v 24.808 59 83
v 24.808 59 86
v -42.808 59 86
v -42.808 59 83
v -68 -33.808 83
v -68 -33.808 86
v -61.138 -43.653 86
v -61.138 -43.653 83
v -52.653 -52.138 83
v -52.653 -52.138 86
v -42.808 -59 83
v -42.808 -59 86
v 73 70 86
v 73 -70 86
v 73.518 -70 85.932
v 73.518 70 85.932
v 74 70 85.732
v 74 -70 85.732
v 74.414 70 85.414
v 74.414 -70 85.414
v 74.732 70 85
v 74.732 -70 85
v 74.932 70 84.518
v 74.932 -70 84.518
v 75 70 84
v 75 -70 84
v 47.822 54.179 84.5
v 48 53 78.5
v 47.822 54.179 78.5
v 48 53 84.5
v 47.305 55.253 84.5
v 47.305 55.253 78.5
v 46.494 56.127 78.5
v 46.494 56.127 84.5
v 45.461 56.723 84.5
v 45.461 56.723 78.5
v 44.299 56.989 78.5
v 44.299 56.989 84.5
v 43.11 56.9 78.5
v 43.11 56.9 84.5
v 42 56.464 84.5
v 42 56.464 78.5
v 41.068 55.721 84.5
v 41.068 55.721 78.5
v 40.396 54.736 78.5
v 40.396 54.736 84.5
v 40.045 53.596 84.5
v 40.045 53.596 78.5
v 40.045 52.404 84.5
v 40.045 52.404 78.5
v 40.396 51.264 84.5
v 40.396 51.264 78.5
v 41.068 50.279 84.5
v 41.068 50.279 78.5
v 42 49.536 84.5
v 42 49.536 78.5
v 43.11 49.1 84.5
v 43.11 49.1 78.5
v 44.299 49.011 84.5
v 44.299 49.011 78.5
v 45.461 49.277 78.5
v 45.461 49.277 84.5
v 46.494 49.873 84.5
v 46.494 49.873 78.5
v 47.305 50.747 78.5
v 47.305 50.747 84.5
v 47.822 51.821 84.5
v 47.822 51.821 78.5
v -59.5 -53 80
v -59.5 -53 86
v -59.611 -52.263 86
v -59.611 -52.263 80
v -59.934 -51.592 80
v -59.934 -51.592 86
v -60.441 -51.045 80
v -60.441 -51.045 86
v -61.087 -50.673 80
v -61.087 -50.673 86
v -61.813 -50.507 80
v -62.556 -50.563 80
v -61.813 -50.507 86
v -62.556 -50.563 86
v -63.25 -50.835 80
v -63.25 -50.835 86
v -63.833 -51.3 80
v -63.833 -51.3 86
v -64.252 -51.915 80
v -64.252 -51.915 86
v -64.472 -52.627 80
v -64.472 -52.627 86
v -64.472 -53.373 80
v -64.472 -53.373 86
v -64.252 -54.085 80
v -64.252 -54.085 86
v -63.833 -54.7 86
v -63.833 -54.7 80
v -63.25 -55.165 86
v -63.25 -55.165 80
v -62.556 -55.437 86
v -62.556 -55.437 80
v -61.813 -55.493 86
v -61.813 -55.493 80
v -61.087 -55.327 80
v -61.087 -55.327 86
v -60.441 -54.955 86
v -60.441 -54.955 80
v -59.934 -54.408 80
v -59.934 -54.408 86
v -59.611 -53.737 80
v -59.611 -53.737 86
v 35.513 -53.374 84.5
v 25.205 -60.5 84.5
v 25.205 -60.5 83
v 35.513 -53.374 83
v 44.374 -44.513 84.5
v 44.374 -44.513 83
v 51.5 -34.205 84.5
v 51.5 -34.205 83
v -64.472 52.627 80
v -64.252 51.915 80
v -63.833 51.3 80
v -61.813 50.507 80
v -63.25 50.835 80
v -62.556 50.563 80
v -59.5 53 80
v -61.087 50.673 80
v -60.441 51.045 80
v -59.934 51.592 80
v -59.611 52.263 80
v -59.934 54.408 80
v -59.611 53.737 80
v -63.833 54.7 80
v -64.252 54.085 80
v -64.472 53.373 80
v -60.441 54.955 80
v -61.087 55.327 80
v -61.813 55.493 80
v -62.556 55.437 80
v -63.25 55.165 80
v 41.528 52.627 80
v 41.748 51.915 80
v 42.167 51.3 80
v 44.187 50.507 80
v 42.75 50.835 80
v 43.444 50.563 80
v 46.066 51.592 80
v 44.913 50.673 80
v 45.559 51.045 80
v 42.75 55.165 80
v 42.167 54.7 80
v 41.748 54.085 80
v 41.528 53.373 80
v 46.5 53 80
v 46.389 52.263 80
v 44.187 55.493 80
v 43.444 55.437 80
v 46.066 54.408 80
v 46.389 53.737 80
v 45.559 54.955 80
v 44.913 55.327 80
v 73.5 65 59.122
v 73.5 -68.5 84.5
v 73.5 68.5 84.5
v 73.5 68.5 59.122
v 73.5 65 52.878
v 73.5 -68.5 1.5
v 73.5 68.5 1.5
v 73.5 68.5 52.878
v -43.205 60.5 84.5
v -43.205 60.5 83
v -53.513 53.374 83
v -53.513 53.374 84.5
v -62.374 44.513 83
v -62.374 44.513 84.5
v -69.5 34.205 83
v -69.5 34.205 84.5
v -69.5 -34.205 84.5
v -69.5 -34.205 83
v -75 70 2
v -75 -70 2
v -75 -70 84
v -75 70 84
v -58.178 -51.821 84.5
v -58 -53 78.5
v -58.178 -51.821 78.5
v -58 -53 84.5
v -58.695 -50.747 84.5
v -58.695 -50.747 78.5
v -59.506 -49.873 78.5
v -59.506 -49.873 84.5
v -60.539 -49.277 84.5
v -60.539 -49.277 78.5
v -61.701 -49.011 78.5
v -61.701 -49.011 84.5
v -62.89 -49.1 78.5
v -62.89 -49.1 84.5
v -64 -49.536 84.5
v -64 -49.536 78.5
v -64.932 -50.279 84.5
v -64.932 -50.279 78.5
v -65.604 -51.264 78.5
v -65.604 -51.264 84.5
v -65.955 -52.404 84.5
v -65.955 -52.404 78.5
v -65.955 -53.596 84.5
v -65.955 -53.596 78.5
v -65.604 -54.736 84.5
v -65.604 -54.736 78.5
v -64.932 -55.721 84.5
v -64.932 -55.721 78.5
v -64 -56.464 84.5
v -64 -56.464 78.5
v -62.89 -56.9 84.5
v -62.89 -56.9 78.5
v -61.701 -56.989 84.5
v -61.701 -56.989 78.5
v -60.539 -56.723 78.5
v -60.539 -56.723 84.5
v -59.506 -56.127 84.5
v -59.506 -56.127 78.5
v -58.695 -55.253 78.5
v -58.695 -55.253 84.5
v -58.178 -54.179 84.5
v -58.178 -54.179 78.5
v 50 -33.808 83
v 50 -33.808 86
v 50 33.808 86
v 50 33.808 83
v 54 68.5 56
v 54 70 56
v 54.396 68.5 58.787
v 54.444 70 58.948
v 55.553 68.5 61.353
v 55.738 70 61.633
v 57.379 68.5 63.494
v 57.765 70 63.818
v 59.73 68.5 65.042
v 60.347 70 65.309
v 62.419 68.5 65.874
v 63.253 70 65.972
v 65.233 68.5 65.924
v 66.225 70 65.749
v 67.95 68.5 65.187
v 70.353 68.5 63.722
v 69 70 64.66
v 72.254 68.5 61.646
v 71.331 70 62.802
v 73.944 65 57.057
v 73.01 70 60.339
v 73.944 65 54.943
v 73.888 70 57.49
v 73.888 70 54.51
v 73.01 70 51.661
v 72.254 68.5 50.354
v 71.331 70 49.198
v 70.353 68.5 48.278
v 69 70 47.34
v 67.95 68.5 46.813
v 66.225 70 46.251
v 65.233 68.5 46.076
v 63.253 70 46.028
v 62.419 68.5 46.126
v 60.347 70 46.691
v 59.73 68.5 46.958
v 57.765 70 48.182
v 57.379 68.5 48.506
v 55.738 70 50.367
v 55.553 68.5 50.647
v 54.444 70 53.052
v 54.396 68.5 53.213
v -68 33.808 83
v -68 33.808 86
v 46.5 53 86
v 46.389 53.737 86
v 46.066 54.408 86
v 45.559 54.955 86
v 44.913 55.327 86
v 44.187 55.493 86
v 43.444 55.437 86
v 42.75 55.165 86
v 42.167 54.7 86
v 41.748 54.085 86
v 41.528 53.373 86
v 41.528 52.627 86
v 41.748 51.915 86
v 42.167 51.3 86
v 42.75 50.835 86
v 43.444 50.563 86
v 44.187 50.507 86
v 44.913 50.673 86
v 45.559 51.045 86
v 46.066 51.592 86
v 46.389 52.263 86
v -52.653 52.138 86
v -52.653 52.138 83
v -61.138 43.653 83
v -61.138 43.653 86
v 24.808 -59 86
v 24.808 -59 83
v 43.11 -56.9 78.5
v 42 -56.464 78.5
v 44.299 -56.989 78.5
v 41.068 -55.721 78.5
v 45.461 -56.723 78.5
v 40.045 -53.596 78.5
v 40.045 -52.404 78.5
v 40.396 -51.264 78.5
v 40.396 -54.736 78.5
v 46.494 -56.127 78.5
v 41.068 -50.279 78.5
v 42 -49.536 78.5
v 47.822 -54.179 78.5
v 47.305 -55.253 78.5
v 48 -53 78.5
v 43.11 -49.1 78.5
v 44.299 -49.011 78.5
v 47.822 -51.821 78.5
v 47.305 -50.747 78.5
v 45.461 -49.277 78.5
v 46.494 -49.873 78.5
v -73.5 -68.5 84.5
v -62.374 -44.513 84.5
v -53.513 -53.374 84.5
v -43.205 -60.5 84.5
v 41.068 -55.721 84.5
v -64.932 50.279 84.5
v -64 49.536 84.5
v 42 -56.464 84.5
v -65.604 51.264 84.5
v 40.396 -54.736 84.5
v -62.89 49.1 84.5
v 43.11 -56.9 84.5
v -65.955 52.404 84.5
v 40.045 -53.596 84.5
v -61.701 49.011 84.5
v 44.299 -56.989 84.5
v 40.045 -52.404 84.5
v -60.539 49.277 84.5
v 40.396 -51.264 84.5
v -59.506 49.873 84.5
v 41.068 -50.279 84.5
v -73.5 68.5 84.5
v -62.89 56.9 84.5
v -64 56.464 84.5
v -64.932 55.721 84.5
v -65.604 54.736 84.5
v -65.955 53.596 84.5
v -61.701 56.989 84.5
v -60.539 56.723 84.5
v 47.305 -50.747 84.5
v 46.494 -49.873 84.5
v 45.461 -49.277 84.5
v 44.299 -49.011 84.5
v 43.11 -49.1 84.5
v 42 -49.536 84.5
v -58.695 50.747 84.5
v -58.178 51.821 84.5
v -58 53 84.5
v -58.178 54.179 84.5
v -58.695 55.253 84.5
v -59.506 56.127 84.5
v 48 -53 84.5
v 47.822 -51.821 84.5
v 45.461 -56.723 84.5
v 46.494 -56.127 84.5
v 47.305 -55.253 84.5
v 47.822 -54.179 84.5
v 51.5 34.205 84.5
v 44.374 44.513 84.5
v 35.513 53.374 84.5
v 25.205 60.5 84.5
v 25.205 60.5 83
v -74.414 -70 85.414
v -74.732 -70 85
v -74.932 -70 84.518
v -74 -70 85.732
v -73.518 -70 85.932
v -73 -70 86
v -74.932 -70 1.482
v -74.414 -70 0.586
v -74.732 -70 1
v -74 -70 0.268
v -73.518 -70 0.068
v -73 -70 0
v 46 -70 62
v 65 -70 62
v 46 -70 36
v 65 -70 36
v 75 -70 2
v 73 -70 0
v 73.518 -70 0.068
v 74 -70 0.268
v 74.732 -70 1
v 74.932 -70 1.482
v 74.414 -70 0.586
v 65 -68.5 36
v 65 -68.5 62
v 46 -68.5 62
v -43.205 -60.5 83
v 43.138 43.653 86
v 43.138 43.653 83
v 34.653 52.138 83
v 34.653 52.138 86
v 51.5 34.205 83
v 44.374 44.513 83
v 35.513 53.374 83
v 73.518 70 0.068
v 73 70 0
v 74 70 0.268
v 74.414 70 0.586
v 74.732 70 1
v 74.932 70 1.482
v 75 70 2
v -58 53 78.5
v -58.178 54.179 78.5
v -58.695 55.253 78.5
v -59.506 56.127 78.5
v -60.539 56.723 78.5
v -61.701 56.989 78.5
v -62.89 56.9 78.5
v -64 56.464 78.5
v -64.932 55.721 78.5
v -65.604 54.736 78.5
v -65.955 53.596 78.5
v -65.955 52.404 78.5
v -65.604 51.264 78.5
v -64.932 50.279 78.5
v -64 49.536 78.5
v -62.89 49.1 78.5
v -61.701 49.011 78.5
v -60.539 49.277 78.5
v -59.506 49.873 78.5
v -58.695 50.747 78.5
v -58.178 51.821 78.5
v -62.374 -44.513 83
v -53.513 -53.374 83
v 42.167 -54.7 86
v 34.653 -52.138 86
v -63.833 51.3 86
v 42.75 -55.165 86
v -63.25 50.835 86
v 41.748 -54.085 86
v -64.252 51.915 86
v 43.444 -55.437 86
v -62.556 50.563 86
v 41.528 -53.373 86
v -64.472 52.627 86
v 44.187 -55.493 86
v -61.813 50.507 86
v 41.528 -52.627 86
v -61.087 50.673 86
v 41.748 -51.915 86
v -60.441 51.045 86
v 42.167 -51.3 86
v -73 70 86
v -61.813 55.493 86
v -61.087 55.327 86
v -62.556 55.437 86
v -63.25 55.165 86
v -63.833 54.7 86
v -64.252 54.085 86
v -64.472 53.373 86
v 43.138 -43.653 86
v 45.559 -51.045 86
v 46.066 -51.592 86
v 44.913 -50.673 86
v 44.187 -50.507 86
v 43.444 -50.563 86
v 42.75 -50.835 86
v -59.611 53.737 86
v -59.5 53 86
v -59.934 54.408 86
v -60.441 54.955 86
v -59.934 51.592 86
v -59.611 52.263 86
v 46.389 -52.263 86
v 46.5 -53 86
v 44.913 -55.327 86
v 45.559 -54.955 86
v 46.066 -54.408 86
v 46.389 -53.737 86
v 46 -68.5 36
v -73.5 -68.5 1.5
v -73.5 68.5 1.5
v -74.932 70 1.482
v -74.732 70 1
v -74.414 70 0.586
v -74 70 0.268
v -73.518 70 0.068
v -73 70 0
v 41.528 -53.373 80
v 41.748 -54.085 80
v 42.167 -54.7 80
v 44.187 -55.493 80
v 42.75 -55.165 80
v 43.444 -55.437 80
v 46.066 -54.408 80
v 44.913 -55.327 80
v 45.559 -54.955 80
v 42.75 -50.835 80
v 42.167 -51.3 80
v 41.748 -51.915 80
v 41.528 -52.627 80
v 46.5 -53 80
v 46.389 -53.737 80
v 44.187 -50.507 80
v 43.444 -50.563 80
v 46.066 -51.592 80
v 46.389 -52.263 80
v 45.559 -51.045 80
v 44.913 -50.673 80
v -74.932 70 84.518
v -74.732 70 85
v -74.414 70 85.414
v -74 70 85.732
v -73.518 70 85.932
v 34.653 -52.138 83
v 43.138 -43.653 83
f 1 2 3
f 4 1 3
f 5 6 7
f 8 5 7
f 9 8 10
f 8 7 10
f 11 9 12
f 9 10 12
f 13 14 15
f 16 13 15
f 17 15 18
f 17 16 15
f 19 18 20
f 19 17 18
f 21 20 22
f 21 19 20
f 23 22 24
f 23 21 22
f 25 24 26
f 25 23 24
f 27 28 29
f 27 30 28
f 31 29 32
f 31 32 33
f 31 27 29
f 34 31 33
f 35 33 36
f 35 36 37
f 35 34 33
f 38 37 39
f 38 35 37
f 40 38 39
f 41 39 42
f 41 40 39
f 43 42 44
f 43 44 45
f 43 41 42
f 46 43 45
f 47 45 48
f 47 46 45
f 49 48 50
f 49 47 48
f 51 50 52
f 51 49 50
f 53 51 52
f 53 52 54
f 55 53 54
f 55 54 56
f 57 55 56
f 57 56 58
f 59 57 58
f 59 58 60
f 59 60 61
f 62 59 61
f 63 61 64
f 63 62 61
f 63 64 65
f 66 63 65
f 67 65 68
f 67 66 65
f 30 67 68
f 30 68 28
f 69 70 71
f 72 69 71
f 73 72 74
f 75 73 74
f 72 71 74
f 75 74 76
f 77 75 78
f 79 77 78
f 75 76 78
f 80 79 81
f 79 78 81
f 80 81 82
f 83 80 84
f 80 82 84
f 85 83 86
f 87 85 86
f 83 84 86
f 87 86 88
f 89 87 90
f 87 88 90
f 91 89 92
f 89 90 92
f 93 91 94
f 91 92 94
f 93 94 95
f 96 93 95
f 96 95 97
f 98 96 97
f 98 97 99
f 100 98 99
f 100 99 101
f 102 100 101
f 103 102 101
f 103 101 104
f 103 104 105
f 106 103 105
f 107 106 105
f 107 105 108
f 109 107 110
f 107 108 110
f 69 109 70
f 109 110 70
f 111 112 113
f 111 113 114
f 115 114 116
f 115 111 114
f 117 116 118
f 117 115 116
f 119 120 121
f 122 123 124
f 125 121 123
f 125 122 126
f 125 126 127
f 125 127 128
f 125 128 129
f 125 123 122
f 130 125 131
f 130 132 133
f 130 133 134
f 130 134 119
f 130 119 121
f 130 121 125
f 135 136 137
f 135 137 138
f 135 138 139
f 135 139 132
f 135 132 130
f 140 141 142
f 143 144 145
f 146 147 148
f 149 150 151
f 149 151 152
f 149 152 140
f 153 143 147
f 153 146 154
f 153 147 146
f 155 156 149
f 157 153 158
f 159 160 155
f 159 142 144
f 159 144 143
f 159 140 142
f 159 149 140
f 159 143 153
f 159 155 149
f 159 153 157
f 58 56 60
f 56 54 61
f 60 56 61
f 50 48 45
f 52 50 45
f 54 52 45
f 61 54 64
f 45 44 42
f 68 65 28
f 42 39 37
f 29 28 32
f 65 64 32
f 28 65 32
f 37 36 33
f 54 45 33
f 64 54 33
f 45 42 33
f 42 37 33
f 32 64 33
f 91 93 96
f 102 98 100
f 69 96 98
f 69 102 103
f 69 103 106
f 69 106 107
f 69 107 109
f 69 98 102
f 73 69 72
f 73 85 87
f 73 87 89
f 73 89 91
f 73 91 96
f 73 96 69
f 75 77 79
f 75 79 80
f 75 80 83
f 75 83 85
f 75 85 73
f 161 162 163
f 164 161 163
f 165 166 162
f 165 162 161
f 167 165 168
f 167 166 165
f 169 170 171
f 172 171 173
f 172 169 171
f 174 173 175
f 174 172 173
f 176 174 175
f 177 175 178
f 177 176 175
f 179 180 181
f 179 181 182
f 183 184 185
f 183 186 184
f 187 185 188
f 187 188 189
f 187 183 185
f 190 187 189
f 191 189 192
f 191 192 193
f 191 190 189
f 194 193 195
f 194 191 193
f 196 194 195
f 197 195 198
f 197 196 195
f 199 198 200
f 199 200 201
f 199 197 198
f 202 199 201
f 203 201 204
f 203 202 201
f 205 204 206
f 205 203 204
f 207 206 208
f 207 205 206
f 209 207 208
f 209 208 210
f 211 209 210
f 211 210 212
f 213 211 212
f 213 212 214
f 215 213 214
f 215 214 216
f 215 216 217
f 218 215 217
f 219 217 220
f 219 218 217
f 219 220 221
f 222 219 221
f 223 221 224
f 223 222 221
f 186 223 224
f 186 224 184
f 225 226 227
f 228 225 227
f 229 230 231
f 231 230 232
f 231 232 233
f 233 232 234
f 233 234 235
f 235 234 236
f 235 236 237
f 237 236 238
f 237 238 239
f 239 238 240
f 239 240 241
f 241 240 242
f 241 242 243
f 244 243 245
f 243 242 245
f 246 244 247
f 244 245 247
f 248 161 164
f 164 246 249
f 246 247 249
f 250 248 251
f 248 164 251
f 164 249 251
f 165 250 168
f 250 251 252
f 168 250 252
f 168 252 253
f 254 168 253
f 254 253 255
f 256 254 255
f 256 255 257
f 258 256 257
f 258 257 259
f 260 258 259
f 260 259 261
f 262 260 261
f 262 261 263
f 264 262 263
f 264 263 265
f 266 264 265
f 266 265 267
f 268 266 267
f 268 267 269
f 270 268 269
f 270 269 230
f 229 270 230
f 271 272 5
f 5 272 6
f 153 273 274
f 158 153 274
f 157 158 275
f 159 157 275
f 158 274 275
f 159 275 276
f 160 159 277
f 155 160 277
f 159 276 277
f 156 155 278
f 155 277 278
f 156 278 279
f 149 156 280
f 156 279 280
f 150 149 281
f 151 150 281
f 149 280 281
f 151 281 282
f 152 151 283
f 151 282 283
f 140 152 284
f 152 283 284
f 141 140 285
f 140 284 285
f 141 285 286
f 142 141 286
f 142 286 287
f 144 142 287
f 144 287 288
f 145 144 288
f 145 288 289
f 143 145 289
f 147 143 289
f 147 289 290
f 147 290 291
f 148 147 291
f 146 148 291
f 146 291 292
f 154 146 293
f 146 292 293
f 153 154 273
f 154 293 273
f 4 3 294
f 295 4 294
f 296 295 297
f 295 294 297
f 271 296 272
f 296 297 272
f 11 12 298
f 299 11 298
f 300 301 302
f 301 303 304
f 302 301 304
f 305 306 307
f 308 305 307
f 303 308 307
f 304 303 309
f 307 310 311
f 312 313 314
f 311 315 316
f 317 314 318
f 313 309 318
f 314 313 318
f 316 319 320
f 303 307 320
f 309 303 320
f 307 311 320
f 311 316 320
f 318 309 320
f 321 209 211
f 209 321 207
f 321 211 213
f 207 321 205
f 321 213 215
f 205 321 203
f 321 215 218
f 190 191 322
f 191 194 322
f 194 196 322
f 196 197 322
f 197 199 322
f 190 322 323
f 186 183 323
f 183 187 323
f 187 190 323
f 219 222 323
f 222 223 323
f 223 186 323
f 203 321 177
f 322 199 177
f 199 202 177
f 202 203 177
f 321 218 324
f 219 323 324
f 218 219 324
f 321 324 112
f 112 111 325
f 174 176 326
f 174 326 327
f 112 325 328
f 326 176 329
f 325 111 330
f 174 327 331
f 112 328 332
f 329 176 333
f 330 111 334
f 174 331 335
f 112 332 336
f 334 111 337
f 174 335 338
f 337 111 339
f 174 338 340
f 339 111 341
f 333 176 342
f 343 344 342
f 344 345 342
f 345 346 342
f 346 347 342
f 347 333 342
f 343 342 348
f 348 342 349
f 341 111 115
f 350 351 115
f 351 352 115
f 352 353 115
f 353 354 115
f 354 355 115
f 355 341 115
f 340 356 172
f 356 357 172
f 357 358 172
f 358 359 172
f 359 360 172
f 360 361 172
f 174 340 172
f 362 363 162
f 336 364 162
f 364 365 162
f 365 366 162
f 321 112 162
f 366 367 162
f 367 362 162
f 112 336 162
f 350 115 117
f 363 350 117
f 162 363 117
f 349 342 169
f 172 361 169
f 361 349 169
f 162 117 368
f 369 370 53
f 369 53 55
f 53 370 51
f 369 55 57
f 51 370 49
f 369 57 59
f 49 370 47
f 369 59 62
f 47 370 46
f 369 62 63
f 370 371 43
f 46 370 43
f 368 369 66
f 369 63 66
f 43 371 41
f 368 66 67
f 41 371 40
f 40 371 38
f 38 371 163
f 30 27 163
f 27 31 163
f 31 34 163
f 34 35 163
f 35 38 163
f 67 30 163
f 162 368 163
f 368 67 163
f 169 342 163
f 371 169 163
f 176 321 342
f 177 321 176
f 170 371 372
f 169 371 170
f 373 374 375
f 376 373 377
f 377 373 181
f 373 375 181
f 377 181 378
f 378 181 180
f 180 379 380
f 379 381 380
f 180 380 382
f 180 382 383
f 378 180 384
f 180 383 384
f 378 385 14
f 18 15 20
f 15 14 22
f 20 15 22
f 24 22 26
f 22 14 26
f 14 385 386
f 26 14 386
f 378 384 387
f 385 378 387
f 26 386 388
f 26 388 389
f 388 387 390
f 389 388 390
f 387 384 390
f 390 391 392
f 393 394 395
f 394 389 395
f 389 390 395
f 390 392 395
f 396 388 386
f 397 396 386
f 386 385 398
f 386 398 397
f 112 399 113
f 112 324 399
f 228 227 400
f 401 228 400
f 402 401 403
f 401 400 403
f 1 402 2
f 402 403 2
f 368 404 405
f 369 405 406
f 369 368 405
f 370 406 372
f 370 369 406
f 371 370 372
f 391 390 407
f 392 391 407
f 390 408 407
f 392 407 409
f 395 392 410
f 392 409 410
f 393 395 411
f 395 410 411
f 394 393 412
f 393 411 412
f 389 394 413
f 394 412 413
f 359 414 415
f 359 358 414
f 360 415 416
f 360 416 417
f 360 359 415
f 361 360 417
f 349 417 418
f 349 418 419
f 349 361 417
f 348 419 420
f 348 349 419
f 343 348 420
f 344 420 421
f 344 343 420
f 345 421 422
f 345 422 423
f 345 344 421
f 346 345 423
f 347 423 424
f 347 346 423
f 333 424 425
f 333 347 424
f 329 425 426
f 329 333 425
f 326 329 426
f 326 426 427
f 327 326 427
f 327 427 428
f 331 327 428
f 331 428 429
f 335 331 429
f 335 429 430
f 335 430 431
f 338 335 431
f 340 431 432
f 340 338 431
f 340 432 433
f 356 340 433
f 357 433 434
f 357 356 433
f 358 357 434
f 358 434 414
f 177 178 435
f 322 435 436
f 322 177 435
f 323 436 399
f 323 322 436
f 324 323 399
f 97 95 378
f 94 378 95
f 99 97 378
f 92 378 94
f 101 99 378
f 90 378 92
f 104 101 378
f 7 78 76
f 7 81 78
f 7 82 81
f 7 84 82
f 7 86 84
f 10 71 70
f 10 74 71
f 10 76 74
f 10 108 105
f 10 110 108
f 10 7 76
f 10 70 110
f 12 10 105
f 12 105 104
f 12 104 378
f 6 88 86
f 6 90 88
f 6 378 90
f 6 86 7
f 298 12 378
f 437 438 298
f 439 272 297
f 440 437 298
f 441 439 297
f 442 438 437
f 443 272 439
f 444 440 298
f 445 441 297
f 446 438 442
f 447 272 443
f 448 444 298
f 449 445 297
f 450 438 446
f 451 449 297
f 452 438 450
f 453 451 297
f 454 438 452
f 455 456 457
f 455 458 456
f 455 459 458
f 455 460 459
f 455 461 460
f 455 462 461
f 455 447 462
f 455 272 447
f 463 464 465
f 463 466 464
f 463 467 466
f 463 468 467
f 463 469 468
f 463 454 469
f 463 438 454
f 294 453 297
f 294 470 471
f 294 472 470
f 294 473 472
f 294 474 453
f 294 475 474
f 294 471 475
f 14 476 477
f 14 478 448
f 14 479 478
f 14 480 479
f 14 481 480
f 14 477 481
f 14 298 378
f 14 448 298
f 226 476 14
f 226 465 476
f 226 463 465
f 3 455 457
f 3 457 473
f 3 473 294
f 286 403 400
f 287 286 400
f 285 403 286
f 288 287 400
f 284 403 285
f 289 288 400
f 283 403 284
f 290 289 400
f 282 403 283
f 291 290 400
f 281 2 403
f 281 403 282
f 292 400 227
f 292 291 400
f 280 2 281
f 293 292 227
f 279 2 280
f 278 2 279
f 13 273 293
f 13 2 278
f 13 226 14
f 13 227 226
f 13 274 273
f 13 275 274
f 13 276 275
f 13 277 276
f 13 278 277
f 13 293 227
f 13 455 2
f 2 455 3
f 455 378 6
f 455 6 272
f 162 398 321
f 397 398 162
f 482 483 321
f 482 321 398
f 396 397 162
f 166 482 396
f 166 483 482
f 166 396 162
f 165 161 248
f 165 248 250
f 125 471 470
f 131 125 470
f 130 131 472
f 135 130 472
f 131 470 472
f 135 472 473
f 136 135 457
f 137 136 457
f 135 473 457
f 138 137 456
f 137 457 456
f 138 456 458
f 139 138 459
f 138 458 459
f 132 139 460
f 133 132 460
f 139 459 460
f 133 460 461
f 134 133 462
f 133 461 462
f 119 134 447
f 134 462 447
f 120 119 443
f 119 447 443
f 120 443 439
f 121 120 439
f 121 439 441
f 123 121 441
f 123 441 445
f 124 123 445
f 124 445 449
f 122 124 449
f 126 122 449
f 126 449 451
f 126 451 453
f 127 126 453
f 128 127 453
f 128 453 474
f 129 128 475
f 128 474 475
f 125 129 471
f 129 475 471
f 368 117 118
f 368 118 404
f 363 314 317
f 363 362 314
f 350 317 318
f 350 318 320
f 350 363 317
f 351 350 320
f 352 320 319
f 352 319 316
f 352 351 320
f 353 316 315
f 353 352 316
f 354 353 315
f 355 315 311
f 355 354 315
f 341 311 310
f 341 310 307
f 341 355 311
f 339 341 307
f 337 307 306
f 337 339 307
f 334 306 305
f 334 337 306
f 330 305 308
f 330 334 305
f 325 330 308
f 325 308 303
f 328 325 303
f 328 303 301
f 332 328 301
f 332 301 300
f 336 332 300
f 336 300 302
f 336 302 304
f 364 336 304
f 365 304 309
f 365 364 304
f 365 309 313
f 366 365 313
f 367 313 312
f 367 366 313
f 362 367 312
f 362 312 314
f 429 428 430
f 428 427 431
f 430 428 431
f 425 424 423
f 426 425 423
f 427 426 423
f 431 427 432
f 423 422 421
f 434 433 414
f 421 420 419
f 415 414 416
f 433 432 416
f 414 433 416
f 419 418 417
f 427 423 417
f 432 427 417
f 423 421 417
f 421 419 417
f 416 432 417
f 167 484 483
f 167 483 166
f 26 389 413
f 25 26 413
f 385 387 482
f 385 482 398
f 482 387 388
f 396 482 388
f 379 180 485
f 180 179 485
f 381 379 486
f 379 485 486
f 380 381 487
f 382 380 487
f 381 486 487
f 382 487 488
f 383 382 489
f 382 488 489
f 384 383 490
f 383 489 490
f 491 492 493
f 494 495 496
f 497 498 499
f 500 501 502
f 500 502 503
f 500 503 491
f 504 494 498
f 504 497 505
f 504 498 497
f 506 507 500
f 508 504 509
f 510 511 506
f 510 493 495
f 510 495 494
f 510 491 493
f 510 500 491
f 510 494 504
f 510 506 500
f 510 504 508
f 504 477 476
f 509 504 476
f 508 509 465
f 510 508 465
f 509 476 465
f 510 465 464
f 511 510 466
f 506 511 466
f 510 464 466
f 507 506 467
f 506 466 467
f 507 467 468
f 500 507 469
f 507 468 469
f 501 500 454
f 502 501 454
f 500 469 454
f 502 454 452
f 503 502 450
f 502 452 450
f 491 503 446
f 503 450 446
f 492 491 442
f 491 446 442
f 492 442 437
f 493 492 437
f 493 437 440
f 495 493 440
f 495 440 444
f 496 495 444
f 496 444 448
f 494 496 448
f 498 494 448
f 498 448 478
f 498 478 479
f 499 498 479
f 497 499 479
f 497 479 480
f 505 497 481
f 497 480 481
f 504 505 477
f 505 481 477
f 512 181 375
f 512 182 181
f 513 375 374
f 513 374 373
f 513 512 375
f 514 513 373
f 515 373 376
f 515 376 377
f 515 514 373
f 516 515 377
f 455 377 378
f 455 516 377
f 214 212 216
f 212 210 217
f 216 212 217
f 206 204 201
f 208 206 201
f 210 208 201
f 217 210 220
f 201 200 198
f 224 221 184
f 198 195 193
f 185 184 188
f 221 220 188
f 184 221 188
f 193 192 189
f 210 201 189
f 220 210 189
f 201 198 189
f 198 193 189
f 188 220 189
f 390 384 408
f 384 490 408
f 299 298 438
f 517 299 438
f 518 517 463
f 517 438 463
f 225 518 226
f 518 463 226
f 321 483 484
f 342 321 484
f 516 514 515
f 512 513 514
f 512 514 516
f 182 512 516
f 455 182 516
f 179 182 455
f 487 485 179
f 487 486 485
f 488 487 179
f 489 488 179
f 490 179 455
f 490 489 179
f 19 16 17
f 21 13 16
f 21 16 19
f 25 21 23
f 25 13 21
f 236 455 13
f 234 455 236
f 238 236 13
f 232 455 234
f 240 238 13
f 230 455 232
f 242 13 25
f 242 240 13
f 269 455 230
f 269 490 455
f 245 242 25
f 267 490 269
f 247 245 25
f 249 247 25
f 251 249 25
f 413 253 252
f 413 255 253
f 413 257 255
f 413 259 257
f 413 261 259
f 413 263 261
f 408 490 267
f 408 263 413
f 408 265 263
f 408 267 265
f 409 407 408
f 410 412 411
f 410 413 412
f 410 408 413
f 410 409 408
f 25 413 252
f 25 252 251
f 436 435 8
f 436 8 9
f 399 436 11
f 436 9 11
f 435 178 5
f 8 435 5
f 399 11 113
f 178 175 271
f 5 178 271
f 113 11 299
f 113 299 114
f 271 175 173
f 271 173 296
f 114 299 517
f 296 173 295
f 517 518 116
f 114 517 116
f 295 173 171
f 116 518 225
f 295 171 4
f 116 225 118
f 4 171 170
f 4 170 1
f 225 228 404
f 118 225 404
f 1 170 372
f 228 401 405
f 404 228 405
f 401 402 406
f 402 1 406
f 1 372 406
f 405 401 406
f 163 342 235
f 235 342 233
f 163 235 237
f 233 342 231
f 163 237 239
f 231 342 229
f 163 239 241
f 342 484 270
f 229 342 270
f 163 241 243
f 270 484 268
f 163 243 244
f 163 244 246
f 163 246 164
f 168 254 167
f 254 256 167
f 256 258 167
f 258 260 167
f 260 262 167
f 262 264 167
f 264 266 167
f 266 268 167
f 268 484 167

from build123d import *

# Parameters (mm, degrees)
F0_W     = 150
F0_H     = 140
F1_DEPTH = 86
F3_DEPTH = 3
F2_R     = 2.5
F4_DEPTH = 6
F5_T     = -1.5
F6_W     = 19
F6_H     = 26
F7_DEPTH = 10
F8_R     = 10
F9_DEPTH = 5
F10_R    = 2


# Not quite as in the source:
# - a shell that OpenCascade refuses in one call is made with other operations: the cavity is built on its own and cut out


with BuildPart() as f1:
    # F0 (on Top) → F1 (new body)
    with BuildSketch(Plane.XY):
        Rectangle(F0_W, F0_H)
    extrude(amount=F1_DEPTH)

    # F2 (on face) → F3 (cut)
    with BuildSketch(Plane.XY.offset(86)):
        with BuildLine():
            Line((24.8082830088, 59), (-42.8082830088, 59))
            ThreePointArc((-42.8082830088, 59), (-57.0832611207, 48.0832611207), (-68, 33.8082830088))
            Line((-68, 33.8082830088), (-68, -33.8082830088))
            ThreePointArc((-68, -33.8082830088), (-57.0832611207, -48.0832611207), (-42.8082830088, -59))
            Line((-42.8082830088, -59), (24.8082830088, -59))
            ThreePointArc((24.8082830088, -59), (39.0832611207, -48.0832611207), (50, -33.8082830088))
            Line((50, -33.8082830088), (50, 33.8082830088))
            ThreePointArc((50, 33.8082830088), (39.0832611207, 48.0832611207), (24.8082830088, 59))
        make_face()
    extrude(amount=-F3_DEPTH, mode=Mode.SUBTRACT)

    # F2 (on face) → F4 (cut)
    with BuildSketch(Plane.XY.offset(86)):
        with Locations((-62, 53)):
            Circle(F2_R)
        with Locations((44, 53)):
            Circle(F2_R)
        with Locations((44, -53)):
            Circle(F2_R)
        with Locations((-62, -53)):
            Circle(F2_R)
    extrude(amount=-F4_DEPTH, mode=Mode.SUBTRACT)

    # F5: a shell. OpenCascade refuses it in one call, so the cavity is built on its own and cut out:
    # the body offset inwards by the wall thickness, plus a prism from it out through each open face.
    f5_core = offset(f1.part, amount=F5_T, kind=Kind.INTERSECTION, mode=Mode.PRIVATE)
    f5_exits = [f5_core.faces().sort_by_distance(p)[0] for p in [
        (-9, 0, 81.5),
    ]]
    add(f5_core, mode=Mode.SUBTRACT)
    extrude(f5_exits, amount=-F5_T, mode=Mode.SUBTRACT)

    # F6 (on face) → F7 (cut)
    with BuildSketch(Plane.XZ.offset(70)):
        with Locations((55.5, 49)):
            Rectangle(F6_W, F6_H)
    extrude(amount=-F7_DEPTH, mode=Mode.SUBTRACT)

    # F8 (on face) → F9 (cut)
    with BuildSketch(Plane(origin=(0, 70, 0), x_dir=(-1, 0, 0), z_dir=(0, 1, 0))):
        with Locations((-64, 56)):
            Circle(F8_R)
    extrude(amount=-F9_DEPTH, mode=Mode.SUBTRACT)

    # F10
    f10_edges = [f1.edges().sort_by_distance(p)[0] for p in [
        (75, 0, 86),
        (75, 0, 0),
        (-75, 0, 86),
        (-75, 0, 0),
    ]]
    fillet(f10_edges, radius=F10_R)


solid = f1.part
